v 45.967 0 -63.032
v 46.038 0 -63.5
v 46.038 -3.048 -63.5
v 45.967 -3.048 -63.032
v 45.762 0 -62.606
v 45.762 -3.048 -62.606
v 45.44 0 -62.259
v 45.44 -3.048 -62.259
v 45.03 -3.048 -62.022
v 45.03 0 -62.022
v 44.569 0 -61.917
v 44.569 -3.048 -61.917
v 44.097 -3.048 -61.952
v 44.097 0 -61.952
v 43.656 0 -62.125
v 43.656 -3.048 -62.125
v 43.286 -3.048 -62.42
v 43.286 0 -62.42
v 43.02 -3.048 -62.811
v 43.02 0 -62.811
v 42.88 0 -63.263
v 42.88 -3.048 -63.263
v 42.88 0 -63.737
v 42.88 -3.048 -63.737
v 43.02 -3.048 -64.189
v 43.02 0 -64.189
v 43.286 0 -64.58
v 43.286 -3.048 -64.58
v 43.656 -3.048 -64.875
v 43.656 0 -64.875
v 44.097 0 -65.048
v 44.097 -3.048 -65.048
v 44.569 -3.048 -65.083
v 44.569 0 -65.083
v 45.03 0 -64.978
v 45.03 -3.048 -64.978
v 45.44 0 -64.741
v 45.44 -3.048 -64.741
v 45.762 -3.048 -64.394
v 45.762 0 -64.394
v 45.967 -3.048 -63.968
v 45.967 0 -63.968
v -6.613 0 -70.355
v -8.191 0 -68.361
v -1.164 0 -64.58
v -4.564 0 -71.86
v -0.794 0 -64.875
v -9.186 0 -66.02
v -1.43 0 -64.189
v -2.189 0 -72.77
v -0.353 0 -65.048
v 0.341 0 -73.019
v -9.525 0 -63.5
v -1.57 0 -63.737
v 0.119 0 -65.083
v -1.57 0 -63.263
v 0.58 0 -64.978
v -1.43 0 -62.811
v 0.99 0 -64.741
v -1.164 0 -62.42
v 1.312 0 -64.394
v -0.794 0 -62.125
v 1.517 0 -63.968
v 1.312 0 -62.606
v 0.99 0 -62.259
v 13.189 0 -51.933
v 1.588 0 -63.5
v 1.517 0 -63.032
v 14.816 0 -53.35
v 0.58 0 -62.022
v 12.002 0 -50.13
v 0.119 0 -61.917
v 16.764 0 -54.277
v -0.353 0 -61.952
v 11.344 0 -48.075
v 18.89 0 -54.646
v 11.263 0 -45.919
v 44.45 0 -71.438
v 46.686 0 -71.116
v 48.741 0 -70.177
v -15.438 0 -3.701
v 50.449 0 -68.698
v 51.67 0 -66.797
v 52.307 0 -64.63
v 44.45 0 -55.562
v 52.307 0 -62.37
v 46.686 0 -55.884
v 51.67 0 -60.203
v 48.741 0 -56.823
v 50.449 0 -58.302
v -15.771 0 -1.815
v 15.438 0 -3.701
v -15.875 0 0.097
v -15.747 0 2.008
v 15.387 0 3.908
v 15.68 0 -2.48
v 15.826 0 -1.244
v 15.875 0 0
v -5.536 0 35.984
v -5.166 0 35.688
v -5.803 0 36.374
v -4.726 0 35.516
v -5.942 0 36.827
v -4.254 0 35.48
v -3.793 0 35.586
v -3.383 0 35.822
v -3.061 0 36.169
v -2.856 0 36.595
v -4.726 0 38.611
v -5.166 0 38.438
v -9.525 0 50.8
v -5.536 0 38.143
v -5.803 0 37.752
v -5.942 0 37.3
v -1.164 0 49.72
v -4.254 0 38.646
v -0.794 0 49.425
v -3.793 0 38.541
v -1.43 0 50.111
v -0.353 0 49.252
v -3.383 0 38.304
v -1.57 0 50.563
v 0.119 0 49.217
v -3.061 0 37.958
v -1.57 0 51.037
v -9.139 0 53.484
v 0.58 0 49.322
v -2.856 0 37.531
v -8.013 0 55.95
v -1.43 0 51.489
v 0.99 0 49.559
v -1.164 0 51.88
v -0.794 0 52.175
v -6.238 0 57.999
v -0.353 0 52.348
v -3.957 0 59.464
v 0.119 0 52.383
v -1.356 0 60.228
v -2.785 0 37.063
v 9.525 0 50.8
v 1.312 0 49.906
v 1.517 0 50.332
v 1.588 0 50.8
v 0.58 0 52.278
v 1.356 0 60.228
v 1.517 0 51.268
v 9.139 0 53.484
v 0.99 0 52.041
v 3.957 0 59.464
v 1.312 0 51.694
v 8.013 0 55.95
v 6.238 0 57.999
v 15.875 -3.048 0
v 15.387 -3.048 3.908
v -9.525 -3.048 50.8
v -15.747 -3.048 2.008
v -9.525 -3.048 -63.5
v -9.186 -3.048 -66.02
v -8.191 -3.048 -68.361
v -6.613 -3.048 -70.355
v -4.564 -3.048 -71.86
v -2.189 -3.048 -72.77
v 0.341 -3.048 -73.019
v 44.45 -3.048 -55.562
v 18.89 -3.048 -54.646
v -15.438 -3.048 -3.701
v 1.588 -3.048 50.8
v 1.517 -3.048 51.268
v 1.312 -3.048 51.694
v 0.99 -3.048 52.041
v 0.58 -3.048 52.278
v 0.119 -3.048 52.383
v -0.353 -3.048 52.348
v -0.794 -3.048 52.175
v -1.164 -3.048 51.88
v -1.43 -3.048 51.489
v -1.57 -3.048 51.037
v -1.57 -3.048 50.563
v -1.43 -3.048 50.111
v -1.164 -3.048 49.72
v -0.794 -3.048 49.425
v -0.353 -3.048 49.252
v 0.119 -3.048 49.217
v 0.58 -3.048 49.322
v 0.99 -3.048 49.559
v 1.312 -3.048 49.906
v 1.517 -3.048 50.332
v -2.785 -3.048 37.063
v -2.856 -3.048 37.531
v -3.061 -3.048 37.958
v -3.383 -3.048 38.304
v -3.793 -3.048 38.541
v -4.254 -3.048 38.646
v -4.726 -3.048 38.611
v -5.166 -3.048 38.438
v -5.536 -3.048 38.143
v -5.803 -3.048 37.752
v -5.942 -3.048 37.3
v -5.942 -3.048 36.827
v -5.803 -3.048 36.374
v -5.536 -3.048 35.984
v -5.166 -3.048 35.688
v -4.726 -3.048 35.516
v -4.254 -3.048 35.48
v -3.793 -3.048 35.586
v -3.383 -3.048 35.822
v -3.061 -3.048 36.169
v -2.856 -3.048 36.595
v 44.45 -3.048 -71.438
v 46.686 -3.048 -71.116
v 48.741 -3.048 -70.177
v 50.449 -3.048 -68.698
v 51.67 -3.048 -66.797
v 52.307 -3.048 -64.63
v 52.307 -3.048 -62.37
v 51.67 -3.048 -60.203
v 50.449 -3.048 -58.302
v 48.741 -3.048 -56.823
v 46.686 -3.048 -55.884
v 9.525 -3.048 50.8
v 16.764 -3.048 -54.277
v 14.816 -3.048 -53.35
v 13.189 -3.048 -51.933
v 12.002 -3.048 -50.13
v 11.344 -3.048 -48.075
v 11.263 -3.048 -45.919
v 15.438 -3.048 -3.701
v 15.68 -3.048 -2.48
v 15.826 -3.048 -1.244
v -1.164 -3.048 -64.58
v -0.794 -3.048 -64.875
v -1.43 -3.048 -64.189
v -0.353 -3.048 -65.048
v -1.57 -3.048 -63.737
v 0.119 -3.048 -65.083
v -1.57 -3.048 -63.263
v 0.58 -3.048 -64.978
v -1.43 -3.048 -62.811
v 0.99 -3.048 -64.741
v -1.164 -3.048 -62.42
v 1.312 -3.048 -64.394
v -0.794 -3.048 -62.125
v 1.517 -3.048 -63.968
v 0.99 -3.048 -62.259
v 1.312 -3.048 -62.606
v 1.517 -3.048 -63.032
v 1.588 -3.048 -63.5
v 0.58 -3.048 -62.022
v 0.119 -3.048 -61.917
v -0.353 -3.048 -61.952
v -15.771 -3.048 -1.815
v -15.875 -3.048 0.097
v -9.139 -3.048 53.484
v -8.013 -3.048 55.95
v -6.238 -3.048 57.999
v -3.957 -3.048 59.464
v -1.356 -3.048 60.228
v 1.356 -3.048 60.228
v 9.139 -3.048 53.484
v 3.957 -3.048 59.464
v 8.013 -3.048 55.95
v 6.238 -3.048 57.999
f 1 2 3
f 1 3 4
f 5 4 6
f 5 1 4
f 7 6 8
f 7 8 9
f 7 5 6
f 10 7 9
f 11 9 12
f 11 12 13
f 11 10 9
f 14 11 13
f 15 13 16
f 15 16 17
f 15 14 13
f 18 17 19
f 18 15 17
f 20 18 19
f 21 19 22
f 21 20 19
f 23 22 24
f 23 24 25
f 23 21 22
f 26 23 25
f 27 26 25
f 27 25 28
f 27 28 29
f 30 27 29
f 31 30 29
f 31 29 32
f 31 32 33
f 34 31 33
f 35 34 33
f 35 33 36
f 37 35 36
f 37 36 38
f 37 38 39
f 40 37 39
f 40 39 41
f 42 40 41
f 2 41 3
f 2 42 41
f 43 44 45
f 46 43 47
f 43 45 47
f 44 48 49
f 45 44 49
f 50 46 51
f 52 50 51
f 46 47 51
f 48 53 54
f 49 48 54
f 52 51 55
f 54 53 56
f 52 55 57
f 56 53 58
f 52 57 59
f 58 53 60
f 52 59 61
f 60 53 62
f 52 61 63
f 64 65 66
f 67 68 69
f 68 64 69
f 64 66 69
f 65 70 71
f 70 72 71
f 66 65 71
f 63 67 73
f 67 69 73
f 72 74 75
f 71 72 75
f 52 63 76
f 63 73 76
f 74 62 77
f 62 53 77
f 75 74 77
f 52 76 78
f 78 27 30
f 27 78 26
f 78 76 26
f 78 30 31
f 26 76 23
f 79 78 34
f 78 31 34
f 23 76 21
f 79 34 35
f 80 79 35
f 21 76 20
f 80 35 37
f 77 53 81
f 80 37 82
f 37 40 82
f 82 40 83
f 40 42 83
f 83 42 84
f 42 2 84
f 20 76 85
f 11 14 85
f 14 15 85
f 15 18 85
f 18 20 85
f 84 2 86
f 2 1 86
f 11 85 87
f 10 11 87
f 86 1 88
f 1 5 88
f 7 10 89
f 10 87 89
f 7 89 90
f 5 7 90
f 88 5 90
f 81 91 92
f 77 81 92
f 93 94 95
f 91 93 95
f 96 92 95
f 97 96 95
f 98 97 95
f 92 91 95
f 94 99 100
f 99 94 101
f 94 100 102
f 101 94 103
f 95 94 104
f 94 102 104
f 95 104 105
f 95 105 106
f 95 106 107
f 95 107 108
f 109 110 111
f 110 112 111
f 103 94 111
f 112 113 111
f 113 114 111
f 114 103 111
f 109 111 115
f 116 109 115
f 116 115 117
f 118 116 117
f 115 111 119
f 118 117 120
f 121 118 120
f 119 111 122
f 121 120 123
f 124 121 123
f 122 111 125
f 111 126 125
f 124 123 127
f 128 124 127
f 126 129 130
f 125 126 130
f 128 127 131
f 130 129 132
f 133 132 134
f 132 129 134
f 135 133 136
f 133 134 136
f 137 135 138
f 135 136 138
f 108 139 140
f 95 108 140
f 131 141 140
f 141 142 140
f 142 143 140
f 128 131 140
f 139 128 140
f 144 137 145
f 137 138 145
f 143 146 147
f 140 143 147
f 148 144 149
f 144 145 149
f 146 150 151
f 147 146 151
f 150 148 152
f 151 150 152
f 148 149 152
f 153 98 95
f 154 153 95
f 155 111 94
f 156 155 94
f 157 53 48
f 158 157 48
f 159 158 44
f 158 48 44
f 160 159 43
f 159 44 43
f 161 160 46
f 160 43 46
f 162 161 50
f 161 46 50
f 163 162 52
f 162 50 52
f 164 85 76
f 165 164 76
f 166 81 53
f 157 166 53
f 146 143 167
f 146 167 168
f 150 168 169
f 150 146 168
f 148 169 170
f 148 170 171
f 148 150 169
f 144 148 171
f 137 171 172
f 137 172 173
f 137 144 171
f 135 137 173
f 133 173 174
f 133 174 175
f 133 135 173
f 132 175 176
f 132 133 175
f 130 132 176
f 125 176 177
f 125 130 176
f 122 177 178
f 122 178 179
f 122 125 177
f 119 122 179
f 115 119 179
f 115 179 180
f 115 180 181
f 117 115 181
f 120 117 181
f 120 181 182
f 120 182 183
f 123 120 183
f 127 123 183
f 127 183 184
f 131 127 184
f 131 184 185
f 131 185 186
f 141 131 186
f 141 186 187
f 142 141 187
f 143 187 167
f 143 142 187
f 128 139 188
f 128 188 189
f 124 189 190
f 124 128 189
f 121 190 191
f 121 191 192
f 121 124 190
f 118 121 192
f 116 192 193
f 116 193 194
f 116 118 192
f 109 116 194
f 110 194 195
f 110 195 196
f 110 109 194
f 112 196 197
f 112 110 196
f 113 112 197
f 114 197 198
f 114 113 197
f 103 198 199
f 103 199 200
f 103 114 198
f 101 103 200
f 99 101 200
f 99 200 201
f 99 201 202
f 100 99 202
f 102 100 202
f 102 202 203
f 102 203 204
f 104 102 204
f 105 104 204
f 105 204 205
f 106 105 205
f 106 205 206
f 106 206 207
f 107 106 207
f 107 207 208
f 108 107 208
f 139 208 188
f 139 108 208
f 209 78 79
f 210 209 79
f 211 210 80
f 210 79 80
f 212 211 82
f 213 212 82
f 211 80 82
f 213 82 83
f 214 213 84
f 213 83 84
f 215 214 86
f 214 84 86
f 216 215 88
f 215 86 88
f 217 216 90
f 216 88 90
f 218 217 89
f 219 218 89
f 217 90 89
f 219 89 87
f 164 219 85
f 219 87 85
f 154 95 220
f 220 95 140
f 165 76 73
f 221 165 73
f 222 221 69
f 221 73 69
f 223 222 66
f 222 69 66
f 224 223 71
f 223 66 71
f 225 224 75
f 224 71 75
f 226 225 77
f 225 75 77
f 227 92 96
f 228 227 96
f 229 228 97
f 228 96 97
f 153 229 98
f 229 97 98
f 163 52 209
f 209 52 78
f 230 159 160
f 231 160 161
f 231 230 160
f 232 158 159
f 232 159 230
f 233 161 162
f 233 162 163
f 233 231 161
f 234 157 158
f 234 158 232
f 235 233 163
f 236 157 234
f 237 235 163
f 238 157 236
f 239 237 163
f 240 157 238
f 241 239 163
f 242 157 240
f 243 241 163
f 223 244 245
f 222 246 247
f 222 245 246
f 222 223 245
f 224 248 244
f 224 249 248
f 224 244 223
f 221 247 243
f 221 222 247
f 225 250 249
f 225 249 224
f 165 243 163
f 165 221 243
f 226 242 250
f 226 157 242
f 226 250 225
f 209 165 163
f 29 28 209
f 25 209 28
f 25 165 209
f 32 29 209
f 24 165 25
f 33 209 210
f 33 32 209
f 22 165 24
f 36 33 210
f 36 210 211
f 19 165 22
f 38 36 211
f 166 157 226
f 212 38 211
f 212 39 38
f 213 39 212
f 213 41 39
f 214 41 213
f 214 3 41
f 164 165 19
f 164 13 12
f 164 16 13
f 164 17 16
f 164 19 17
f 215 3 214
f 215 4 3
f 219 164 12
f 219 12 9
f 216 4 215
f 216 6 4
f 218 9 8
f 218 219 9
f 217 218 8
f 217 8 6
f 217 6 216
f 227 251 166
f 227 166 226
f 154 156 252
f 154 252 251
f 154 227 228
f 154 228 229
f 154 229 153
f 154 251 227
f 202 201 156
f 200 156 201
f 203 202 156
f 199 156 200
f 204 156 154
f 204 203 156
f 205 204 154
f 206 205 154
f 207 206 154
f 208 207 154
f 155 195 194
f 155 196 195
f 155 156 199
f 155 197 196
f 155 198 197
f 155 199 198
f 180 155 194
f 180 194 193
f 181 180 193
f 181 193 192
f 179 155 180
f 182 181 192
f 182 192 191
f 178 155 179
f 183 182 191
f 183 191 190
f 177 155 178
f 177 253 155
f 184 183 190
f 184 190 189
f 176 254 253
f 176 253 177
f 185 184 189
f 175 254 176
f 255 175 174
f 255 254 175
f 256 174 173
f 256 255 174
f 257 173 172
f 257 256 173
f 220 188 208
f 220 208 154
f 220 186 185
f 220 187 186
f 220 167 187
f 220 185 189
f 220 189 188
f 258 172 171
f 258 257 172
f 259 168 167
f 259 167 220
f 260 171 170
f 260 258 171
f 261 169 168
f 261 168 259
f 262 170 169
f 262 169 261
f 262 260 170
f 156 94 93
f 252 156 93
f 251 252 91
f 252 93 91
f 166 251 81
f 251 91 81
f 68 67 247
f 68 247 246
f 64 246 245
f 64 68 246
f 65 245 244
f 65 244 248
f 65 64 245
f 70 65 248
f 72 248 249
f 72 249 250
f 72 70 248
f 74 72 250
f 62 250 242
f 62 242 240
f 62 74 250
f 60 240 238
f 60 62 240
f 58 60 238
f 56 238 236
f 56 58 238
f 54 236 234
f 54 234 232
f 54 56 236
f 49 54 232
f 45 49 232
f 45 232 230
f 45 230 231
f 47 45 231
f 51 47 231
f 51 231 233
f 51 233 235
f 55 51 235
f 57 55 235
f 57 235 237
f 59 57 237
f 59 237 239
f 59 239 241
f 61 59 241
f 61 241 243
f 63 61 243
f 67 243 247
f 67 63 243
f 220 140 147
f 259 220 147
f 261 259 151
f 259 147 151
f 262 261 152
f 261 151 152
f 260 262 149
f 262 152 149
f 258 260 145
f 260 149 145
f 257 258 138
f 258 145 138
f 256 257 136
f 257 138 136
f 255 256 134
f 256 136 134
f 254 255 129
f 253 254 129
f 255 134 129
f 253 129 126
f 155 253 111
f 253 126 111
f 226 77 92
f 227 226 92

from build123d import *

# Parameters (mm, degrees)
F0_R     = 1.5875
F1_DEPTH = 3.048


with BuildPart() as f1:
    # F0 (on Front) → F1 (new body)
    with BuildSketch(Plane.XZ):
        with BuildLine():
            Line((-9.525, 50.8), (-15.747457, 2.008289))
            ThreePointArc((-15.747457, 2.008289), (-15.851677, -0.860203), (-15.437661, -3.700573))
            Line((-15.437661, -3.700573), (-9.525, -63.5))
            ThreePointArc((-9.525, -63.5), (-6.613434, -70.354788), (0.341271, -73.018884))
            Line((0.341271, -73.018884), (44.45, -71.4375))
            ThreePointArc((44.45, -71.4375), (52.3875, -63.5), (44.45, -55.5625))
            Line((44.45, -55.5625), (18.890116, -54.646128))
            ThreePointArc((18.890116, -54.646128), (13.188544, -51.932521), (11.263342, -45.918772))
            Line((11.263342, -45.918772), (15.437661, -3.700573))
            ThreePointArc((15.437661, -3.700573), (15.765286, -1.863163), (15.875, 0))
            Line((15.875, 0), (15.386538, 3.907692))
            Line((15.386538, 3.907692), (9.525, 50.8))
            ThreePointArc((9.525, 50.8), (0, 60.325), (-9.525, 50.8))
        make_face()
        with Locations((0, -63.5)):
            Circle(F0_R, mode=Mode.SUBTRACT)
        with Locations((44.45, -63.5)):
            Circle(F0_R, mode=Mode.SUBTRACT)
        with Locations((-4.372607, 37.063282)):
            Circle(F0_R, mode=Mode.SUBTRACT)
        with Locations((0, 50.8)):
            Circle(F0_R, mode=Mode.SUBTRACT)
    extrude(amount=F1_DEPTH)


solid = f1.part
